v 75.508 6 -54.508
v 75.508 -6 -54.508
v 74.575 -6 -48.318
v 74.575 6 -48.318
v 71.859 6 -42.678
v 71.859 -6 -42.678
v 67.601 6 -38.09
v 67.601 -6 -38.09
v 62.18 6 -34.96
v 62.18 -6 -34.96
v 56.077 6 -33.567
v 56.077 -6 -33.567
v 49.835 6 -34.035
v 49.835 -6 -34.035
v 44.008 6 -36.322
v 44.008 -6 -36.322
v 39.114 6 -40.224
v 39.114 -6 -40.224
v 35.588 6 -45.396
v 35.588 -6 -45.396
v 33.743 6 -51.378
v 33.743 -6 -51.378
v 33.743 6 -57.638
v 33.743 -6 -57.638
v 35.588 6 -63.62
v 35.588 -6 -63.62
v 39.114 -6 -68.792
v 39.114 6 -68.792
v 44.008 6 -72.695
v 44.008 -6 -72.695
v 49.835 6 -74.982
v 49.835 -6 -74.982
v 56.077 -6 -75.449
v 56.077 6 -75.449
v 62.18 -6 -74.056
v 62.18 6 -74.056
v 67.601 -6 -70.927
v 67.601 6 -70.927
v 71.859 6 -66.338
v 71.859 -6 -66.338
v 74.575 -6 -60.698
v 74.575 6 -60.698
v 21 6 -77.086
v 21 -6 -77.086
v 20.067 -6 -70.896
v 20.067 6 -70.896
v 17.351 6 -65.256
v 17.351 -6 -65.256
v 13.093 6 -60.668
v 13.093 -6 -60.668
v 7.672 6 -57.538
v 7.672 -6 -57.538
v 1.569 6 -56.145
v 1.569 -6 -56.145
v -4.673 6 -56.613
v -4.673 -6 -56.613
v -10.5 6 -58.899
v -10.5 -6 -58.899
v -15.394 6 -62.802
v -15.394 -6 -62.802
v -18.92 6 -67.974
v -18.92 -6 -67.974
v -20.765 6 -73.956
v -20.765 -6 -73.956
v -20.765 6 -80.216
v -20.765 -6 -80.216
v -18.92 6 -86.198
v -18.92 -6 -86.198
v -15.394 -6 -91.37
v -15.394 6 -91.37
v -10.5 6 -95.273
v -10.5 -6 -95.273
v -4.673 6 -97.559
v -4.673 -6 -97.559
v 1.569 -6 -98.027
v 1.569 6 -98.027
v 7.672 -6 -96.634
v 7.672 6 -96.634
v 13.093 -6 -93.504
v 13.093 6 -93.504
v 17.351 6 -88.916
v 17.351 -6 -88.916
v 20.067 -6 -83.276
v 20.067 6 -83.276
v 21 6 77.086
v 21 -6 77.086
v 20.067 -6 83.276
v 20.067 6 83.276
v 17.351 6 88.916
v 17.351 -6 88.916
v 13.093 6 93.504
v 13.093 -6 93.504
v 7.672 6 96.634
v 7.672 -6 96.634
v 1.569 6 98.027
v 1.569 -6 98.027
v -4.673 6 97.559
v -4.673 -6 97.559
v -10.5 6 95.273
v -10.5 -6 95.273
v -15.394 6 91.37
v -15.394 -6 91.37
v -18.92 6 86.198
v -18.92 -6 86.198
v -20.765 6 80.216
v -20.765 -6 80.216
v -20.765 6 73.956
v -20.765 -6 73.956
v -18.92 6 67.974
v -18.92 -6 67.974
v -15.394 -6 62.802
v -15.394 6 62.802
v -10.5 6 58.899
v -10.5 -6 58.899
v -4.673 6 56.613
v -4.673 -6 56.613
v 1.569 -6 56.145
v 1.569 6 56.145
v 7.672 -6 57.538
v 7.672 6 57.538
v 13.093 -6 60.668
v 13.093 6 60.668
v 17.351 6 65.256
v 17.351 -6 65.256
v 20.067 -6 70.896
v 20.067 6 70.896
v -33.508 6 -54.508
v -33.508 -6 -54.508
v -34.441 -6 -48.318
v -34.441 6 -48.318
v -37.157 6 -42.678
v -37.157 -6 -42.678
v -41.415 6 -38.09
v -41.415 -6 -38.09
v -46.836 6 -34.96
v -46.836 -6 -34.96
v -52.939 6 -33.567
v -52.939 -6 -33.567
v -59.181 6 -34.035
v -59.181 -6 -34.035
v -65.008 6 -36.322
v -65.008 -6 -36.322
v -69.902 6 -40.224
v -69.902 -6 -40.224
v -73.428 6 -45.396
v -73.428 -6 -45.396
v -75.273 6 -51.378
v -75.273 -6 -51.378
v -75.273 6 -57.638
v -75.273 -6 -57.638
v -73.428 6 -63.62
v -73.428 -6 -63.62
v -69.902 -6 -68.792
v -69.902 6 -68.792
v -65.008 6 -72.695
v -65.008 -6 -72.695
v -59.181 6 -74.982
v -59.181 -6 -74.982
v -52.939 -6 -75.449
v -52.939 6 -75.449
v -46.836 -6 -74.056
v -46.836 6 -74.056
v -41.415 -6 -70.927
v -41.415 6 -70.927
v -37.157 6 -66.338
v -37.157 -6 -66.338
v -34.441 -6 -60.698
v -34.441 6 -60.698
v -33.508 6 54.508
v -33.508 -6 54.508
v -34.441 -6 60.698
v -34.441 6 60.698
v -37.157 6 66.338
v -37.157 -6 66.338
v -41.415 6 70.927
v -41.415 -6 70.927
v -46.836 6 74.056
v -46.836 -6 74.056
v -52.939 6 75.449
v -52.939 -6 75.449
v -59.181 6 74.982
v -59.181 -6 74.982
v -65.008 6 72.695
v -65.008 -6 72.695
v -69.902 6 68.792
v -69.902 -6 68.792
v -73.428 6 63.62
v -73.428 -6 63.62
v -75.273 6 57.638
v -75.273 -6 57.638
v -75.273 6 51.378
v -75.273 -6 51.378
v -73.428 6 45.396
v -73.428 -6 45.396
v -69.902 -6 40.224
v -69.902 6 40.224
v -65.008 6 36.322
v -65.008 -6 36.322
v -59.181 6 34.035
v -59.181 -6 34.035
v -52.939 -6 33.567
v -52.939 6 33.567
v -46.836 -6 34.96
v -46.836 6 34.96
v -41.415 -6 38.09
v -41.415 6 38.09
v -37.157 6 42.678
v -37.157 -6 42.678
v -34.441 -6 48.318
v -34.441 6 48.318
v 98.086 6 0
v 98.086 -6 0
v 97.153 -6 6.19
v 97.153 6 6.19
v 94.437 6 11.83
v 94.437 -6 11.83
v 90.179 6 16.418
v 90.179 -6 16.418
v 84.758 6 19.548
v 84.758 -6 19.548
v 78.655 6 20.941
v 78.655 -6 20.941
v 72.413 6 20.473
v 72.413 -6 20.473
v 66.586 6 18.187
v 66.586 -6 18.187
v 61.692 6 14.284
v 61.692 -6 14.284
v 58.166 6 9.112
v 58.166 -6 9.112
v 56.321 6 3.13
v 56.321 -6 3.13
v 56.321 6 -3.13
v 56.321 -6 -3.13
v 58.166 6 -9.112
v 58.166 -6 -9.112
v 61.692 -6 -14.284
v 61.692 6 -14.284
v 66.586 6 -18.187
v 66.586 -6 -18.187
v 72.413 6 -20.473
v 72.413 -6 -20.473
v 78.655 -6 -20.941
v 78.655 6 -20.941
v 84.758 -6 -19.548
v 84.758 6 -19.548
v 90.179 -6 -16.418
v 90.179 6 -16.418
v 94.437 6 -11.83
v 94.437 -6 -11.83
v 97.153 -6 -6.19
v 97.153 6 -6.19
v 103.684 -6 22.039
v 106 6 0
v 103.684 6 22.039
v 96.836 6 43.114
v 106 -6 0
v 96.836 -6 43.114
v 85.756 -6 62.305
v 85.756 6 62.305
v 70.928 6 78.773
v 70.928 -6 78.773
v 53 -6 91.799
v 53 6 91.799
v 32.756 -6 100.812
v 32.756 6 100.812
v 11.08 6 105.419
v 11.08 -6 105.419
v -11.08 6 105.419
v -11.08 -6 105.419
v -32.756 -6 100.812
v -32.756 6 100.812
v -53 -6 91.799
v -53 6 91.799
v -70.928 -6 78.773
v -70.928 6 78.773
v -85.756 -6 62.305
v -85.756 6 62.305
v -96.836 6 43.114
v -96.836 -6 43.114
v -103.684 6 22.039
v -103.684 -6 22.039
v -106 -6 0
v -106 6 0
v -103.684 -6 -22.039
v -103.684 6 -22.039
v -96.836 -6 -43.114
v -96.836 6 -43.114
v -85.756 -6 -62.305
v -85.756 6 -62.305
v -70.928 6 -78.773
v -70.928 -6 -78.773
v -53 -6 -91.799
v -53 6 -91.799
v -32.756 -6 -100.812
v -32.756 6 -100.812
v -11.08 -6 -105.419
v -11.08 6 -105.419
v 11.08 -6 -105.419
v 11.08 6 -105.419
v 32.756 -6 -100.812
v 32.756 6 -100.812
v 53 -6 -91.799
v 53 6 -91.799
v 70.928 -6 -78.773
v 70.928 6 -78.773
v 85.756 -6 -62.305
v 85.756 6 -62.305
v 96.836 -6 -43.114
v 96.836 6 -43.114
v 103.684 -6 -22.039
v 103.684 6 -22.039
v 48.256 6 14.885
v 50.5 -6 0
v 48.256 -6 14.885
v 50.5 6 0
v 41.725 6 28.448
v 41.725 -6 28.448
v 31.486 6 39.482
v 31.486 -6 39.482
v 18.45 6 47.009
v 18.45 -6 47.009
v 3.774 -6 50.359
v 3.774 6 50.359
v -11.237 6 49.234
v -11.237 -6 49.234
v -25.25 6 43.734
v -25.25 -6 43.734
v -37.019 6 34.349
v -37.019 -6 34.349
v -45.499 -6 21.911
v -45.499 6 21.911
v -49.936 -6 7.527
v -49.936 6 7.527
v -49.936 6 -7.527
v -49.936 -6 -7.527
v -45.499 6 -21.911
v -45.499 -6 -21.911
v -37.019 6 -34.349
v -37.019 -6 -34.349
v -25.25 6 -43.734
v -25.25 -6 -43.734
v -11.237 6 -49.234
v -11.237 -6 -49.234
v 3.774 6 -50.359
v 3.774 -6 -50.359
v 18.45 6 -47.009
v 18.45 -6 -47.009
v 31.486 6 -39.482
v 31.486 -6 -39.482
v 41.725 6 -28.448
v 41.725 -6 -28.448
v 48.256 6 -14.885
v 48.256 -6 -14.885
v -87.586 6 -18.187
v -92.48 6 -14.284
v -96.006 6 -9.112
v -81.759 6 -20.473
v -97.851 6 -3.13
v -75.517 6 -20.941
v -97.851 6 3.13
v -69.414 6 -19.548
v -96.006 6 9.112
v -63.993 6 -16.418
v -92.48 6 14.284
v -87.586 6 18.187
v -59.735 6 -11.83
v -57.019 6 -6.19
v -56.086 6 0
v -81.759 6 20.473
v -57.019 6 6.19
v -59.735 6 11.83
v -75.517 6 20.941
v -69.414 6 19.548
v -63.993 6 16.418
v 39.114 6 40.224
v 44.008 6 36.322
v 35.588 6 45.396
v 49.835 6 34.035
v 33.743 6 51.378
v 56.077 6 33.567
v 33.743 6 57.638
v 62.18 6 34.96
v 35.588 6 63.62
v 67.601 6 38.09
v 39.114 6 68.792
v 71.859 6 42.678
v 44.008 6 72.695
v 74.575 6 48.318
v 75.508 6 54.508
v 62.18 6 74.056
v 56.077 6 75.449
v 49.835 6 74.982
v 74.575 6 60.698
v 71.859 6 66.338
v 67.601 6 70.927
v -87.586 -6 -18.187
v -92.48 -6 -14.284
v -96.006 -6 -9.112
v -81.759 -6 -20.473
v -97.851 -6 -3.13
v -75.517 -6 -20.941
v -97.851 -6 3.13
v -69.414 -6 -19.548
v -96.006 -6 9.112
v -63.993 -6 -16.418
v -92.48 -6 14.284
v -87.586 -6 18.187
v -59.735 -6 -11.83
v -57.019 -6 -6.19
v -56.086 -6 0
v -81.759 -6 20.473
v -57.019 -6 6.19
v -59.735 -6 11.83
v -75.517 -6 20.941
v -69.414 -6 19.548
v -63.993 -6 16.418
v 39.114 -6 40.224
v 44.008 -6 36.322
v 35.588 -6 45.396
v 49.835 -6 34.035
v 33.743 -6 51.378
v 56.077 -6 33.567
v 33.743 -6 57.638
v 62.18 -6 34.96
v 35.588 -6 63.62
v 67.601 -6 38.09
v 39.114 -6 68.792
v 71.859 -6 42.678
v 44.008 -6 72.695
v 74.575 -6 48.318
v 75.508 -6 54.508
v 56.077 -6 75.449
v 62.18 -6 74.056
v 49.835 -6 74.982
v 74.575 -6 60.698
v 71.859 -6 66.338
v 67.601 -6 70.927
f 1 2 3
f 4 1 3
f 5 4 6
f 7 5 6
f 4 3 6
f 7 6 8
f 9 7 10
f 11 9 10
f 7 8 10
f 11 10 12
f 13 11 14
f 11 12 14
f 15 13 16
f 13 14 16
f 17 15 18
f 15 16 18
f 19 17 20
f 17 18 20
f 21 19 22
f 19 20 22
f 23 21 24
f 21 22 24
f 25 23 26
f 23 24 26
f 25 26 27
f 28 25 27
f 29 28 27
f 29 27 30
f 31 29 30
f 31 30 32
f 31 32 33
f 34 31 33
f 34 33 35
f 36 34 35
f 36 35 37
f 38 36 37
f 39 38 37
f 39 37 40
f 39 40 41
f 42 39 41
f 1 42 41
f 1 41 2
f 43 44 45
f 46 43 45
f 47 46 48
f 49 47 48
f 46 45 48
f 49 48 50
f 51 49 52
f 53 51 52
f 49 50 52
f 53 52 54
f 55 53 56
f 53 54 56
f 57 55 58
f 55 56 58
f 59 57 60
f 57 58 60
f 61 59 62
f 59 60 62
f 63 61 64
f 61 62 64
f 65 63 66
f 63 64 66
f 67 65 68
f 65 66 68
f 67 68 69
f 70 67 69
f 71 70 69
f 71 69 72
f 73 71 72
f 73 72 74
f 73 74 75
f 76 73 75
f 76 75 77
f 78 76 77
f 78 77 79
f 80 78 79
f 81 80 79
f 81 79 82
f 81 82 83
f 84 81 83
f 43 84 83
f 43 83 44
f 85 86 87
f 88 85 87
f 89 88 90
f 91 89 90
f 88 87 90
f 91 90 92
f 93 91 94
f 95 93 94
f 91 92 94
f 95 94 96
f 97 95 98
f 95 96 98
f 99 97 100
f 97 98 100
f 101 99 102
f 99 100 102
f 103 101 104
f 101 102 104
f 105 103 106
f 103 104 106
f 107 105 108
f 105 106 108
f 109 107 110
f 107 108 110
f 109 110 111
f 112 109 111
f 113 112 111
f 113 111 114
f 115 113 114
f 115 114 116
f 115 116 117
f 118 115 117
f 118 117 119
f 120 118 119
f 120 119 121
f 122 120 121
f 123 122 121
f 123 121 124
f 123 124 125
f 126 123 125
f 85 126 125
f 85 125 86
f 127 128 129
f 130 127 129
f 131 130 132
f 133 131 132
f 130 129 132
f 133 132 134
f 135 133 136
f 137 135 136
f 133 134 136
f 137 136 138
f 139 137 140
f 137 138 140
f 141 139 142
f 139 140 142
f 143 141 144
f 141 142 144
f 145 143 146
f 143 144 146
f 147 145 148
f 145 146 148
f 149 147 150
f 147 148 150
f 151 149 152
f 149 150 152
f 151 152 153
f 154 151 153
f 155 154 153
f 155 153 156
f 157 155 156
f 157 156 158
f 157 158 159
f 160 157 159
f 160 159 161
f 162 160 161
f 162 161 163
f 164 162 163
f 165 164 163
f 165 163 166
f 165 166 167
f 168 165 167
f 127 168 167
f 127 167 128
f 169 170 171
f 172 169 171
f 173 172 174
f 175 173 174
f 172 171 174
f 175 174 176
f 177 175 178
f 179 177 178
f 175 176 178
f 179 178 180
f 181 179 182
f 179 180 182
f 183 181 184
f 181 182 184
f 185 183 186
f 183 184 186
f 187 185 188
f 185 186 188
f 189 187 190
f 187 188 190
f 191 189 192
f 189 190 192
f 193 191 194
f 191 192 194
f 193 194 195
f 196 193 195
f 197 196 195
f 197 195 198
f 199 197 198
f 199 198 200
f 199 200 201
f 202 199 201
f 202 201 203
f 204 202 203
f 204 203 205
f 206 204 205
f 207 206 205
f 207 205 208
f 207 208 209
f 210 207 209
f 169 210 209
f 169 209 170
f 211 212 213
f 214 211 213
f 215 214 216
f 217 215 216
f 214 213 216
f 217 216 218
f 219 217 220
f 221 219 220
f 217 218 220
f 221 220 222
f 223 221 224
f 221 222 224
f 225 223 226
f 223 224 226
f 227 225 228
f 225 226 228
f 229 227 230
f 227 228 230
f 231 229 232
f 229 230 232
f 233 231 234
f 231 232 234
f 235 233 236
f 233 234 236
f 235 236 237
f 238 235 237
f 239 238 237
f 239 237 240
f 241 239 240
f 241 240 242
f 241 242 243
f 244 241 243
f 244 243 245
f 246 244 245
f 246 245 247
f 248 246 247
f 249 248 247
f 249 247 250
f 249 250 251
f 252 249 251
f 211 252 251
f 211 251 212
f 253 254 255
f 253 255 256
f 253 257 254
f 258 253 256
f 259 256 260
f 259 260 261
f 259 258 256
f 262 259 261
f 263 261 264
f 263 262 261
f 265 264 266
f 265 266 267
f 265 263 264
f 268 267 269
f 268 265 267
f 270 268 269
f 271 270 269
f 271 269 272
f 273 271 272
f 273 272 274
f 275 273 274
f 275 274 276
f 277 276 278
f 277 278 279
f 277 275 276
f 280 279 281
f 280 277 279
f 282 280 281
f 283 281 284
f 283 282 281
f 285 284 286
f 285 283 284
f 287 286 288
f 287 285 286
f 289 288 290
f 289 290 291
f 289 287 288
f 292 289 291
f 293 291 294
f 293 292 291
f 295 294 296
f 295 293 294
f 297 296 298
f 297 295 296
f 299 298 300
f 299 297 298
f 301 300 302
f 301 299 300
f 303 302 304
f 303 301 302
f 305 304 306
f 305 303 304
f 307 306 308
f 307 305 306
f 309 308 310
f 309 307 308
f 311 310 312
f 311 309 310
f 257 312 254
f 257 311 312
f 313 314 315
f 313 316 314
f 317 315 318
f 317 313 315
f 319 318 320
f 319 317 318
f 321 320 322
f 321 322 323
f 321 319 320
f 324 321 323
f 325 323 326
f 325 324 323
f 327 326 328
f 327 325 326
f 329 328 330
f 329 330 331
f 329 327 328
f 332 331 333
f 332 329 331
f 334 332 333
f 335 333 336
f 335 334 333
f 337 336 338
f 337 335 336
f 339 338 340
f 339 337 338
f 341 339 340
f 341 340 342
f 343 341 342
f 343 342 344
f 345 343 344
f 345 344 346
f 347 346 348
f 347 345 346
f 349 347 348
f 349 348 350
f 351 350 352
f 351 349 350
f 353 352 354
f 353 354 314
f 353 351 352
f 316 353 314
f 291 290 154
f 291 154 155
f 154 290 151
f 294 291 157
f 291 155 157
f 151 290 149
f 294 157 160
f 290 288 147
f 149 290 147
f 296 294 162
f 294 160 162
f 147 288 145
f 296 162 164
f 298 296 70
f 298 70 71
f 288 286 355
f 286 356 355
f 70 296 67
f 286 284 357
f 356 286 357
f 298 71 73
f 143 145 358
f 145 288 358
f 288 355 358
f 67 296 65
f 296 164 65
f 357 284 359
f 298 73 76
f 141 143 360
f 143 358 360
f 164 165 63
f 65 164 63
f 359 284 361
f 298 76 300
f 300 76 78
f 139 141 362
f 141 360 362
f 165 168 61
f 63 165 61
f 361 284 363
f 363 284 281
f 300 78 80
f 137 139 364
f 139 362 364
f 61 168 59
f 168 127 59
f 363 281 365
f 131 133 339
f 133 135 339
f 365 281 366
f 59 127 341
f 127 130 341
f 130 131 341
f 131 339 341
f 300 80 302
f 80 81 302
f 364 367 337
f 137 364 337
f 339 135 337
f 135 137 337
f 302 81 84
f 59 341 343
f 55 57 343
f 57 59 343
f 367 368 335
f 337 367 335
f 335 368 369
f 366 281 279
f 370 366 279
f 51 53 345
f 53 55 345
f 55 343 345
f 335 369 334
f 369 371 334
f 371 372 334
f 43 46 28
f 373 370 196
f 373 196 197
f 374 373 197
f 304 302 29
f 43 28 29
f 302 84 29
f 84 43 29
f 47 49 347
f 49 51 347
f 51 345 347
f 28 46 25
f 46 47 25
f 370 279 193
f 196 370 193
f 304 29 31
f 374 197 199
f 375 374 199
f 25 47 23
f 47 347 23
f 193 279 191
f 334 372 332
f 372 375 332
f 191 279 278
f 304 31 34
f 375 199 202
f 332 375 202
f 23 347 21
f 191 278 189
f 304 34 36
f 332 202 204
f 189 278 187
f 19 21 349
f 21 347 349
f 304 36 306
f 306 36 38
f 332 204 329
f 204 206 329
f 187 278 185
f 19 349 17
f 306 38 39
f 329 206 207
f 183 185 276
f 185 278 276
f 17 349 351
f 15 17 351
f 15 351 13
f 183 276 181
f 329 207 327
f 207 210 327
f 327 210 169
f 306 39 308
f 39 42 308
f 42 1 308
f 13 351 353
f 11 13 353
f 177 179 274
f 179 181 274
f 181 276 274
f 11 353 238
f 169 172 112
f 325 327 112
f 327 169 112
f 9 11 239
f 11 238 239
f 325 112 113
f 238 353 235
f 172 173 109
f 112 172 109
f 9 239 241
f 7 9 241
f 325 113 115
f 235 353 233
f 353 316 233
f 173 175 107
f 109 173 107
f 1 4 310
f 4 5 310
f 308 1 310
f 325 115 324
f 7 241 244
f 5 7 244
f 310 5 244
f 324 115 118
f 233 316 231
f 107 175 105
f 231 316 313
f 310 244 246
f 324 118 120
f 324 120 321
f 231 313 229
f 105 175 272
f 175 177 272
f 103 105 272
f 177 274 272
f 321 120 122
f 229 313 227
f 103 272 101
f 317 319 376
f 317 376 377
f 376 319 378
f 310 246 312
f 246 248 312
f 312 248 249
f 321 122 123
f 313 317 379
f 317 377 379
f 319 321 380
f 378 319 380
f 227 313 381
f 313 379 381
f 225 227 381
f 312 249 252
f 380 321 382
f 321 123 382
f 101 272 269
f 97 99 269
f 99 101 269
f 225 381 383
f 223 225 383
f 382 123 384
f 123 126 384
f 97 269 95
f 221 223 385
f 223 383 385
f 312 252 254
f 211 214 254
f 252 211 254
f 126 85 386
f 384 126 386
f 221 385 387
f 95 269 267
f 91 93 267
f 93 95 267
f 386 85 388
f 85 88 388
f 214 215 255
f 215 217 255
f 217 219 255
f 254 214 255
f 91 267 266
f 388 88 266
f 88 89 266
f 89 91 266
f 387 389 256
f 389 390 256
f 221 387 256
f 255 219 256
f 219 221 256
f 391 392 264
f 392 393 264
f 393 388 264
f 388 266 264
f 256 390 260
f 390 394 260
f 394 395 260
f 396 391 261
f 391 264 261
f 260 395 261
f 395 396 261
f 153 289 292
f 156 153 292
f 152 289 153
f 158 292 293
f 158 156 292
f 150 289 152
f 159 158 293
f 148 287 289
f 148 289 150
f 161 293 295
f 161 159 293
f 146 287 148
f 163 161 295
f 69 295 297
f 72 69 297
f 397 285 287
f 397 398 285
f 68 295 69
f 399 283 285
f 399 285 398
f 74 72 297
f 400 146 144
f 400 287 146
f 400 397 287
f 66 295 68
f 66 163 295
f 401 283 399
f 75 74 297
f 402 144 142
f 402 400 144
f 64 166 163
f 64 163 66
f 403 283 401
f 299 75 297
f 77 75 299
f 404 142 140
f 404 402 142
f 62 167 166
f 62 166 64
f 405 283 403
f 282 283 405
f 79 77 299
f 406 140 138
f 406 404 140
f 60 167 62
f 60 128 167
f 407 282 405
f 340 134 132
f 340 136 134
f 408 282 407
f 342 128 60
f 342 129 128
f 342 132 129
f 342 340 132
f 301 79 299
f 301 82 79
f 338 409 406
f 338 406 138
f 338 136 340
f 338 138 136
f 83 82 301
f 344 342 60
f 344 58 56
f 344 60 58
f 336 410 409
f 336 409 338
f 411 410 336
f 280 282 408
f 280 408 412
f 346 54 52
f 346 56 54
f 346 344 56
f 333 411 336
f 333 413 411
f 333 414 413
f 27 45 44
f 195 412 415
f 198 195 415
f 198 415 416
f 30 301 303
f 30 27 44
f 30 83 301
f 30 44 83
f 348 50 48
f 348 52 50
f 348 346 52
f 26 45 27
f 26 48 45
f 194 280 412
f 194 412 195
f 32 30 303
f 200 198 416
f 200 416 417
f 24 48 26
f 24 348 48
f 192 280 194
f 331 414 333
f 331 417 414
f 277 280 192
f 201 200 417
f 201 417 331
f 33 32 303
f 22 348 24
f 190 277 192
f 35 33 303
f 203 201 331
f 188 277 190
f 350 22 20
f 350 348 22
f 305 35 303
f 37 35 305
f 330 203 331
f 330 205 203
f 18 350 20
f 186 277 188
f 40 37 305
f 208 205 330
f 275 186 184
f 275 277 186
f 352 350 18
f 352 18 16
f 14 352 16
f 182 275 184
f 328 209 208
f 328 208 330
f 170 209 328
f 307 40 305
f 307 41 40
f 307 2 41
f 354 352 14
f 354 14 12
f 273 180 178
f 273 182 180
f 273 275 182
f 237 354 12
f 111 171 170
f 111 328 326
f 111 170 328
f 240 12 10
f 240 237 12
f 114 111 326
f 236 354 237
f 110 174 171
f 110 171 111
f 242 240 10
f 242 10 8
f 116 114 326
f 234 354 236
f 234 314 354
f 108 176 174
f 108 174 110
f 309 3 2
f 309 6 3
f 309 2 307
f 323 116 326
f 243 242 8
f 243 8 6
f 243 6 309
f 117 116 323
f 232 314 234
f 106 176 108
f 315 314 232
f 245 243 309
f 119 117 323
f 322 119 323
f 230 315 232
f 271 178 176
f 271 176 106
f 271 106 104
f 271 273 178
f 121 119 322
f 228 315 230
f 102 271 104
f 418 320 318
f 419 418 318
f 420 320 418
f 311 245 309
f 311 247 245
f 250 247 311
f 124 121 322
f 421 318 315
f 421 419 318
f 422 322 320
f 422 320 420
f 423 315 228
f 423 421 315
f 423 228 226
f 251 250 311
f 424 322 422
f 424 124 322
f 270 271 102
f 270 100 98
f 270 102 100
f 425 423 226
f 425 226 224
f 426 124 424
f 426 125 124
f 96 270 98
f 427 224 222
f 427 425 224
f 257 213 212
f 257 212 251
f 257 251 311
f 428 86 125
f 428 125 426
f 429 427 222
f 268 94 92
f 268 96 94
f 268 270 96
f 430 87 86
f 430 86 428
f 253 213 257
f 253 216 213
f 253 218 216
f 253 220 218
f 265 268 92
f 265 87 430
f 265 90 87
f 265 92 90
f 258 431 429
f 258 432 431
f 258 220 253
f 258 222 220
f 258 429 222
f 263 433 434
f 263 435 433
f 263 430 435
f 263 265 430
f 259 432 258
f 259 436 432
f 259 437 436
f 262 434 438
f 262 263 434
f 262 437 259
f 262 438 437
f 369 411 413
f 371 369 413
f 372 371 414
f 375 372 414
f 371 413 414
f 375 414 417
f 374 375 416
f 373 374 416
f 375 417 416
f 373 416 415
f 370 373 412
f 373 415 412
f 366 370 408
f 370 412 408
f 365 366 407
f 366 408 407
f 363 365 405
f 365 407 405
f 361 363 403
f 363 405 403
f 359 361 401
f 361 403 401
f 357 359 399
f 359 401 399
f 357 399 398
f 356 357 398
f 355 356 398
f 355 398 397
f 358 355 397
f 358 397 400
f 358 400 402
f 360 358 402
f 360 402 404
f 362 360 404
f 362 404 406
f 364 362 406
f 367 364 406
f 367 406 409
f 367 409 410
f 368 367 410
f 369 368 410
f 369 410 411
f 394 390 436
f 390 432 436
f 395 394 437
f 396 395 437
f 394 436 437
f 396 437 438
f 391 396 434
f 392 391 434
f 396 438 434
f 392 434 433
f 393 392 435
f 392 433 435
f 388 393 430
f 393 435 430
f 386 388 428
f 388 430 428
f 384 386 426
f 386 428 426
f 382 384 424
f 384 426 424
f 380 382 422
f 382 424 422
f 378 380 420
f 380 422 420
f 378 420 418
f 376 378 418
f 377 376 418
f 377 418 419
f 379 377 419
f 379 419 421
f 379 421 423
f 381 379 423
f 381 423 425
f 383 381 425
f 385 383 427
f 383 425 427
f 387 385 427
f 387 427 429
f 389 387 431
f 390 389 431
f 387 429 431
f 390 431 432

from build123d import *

# Parameters (mm, degrees)
F0_R     = 106
F0_R_2   = 50.5
F1_DEPTH = 6
F2_R     = 21
F3_DEPTH = 12
F4_DEPTH = 25


with BuildPart() as f1:
    # F0 (on Front) → F1 (new body, symmetric)
    with BuildSketch(Plane.XZ):
        Circle(F0_R)
        Circle(F0_R_2, mode=Mode.SUBTRACT)
    extrude(amount=F1_DEPTH, both=True)

    # F2 (on face) → F3 (join)
    with BuildSketch(Plane.XZ.offset(6)):
        with Locations((0, 77.0860096719)):
            Circle(F2_R)
        with Locations((54.5080401736, 54.5080401736)):
            Circle(F2_R)
        with Locations((77.0860096719, 0)):
            Circle(F2_R)
        with Locations((54.5080401736, -54.5080401736)):
            Circle(F2_R)
        with Locations((0, -77.0860096719)):
            Circle(F2_R)
        with Locations((-54.5080401736, -54.5080401736)):
            Circle(F2_R)
        with Locations((-77.0860096719, 0)):
            Circle(F2_R)
        with Locations((-54.5080401736, 54.5080401736)):
            Circle(F2_R)
    extrude(amount=F3_DEPTH)

    # F4 (cut, symmetric): faces of the model
    f4_faces = [f1.faces().sort_by_distance(p)[0] for p in [
        (-77.0860096719, -18, 0),
        (-54.5080401736, -18, 54.5080401736),
        (77.0860096719, -18, 0),
        (54.5080401736, -18, -54.5080401736),
        (0, -18, -77.0860096719),
        (-54.5080401736, -18, -54.5080401736),
        (0, -18, 77.0860096719),
        (54.5080401736, -18, 54.5080401736),
    ]]
    extrude(f4_faces, amount=F4_DEPTH, both=True, mode=Mode.SUBTRACT)


solid = f1.part
